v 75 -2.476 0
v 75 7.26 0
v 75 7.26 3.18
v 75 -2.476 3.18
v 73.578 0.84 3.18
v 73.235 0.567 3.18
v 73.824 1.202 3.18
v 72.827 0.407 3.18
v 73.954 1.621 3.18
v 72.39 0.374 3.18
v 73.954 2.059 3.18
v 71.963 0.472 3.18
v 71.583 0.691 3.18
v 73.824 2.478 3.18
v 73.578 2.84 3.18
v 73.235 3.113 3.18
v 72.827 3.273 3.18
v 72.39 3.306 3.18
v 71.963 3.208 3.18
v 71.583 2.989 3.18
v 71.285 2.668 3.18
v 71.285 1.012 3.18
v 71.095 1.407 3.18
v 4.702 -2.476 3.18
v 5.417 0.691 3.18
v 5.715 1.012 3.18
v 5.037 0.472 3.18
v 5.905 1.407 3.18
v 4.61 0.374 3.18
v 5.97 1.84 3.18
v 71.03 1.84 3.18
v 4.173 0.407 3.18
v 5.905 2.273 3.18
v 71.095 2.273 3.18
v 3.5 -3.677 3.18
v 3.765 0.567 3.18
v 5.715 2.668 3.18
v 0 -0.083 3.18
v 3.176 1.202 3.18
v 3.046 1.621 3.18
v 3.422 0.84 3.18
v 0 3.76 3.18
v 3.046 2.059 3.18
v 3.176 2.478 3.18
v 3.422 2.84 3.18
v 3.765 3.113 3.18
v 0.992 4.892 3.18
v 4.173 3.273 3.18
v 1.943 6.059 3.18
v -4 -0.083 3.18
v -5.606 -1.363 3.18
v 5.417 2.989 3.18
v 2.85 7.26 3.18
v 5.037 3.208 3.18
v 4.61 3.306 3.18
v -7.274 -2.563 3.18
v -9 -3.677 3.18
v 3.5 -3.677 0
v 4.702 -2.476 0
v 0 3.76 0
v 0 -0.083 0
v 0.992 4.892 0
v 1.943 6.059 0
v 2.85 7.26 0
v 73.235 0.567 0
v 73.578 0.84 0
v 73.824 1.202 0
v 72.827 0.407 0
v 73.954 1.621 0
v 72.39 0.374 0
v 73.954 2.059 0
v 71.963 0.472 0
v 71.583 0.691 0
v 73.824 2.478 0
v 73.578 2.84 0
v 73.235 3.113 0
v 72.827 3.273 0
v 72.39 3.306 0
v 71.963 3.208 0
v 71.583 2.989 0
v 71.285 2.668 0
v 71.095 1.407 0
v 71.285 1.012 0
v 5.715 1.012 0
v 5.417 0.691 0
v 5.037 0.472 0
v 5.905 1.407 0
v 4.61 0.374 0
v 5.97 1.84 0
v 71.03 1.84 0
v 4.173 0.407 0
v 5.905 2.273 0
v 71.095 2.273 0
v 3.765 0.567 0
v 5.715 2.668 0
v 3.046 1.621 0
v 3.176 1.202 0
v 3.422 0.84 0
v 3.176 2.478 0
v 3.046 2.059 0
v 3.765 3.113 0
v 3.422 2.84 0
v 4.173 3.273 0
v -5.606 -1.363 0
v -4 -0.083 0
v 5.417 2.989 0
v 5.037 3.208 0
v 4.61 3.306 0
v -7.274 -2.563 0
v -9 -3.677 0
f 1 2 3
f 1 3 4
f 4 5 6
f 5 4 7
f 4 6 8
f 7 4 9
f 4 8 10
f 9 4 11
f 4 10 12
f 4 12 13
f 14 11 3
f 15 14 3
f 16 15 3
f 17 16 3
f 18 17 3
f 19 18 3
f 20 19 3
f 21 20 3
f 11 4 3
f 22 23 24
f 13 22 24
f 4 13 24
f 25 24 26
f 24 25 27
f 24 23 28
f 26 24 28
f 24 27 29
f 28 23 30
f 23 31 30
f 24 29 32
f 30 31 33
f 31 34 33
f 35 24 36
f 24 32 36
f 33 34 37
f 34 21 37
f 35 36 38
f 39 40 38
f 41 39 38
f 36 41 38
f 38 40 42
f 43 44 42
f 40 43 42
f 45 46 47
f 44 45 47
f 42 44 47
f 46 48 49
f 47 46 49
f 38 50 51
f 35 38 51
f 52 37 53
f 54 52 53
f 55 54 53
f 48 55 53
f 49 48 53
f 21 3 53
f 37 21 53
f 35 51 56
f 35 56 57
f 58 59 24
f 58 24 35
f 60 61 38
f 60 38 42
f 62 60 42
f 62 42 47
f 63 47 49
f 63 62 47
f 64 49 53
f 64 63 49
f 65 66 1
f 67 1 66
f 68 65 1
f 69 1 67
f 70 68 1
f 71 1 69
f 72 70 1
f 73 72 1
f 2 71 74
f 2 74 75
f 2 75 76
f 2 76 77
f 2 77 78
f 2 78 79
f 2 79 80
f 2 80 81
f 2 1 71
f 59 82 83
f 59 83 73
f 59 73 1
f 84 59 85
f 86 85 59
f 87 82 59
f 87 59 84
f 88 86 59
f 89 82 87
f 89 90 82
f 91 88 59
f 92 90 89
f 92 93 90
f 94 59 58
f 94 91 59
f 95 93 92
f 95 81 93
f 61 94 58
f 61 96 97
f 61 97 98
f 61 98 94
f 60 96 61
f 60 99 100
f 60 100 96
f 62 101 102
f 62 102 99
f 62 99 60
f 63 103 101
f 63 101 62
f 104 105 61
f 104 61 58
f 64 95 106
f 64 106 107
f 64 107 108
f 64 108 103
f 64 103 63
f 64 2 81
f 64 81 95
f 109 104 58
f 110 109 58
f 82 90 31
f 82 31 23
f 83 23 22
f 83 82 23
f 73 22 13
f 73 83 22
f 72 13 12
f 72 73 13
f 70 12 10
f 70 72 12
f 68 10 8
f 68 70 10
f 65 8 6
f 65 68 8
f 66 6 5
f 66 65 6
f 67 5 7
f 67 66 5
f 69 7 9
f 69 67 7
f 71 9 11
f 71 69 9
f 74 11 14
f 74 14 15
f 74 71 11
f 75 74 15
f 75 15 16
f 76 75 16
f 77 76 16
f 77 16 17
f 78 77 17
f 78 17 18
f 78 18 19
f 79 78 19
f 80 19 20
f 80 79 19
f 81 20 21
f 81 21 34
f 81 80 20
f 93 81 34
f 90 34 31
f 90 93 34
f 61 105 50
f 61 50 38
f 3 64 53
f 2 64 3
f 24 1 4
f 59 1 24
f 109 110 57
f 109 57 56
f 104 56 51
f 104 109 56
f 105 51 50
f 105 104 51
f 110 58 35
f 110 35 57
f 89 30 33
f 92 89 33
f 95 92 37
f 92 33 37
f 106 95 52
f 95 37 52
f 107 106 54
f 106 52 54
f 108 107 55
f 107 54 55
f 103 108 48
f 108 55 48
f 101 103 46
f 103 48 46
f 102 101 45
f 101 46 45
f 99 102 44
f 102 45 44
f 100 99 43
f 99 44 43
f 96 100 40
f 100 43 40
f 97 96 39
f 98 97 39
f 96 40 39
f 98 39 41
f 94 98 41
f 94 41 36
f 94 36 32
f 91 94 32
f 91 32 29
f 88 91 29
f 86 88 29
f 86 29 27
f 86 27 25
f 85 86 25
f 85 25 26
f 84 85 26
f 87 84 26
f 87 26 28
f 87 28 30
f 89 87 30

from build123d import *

# Parameters (mm, degrees)
SKETCH1_R           = 1.47
BOSS_EXTRUDE1_DEPTH = 3.18
SKETCH3_R           = 1.47
CUT_EXTRUDE1_DEPTH  = 76.165537316
CUT_EXTRUDE2_START  = -0.08
SKETCH4_W           = 75
SKETCH4_H           = 3.18
CUT_EXTRUDE2_DEPTH  = 0.08
BOSS_EXTRUDE2_DEPTH = 3.18


with BuildPart() as part:
    # Sketch1 → Boss-Extrude1 (new body)
    with BuildSketch(Plane.XY):
        with BuildLine():
            Line((0, 0), (0, 3.84))
            Line((0, 3.84), (75, 3.84))
            Line((75, 3.84), (75, 0.02441688))
            Line((75, 0.02441688), (75, -2.47558312))
            Line((75, -2.47558312), (4.70169557, -2.47558312))
            Line((4.70169557, -2.47558312), (3.5, -3.67727869))
            Line((3.5, -3.67727869), (-9, -3.67727869))
            ThreePointArc((-9, -3.67727869), (-6.432825468, -1.973348375), (-4, -0.082548586))
            Line((-4, -0.082548586), (0, -0.082548586))
            Line((0, -0.082548586), (0, 0))
        make_face()
        with Locations(Location((72.5, 1.84, 0), (0, 0, 180))):
            Circle(SKETCH1_R, mode=Mode.SUBTRACT)
    extrude(amount=BOSS_EXTRUDE1_DEPTH)

    # Sketch3 → Cut-Extrude1 (cut, through all)
    with BuildSketch(Plane.XY.offset(3.18)):
        with Locations((4.5, 1.84)):
            Circle(SKETCH3_R)
    extrude(amount=-CUT_EXTRUDE1_DEPTH, mode=Mode.SUBTRACT)

    # Sketch4 → Cut-Extrude2 (cut)
    with BuildSketch(Plane(origin=(0, 3.84, 0), x_dir=(1, 0, 0), z_dir=(0, 1, 0)).offset(CUT_EXTRUDE2_START)):
        with Locations((37.5, -1.59)):
            Rectangle(SKETCH4_W, SKETCH4_H)
    extrude(amount=CUT_EXTRUDE2_DEPTH, mode=Mode.SUBTRACT)

    # Sketch6 → Boss-Extrude2 (add)
    with BuildSketch(Plane(origin=(0, 0, 0), x_dir=(-1, 0, 0), z_dir=(0, 0, -1))):
        with BuildLine():
            Line((-2.850337408, 7.26), (-75, 7.26))
            Line((-75, 7.26), (-75, 3.76))
            Line((-75, 3.76), (0, 3.76))
            ThreePointArc((0, 3.76), (-1.47307826, 5.470983314), (-2.850337408, 7.26))
        make_face()
    extrude(amount=-BOSS_EXTRUDE2_DEPTH)


solid = part.part
